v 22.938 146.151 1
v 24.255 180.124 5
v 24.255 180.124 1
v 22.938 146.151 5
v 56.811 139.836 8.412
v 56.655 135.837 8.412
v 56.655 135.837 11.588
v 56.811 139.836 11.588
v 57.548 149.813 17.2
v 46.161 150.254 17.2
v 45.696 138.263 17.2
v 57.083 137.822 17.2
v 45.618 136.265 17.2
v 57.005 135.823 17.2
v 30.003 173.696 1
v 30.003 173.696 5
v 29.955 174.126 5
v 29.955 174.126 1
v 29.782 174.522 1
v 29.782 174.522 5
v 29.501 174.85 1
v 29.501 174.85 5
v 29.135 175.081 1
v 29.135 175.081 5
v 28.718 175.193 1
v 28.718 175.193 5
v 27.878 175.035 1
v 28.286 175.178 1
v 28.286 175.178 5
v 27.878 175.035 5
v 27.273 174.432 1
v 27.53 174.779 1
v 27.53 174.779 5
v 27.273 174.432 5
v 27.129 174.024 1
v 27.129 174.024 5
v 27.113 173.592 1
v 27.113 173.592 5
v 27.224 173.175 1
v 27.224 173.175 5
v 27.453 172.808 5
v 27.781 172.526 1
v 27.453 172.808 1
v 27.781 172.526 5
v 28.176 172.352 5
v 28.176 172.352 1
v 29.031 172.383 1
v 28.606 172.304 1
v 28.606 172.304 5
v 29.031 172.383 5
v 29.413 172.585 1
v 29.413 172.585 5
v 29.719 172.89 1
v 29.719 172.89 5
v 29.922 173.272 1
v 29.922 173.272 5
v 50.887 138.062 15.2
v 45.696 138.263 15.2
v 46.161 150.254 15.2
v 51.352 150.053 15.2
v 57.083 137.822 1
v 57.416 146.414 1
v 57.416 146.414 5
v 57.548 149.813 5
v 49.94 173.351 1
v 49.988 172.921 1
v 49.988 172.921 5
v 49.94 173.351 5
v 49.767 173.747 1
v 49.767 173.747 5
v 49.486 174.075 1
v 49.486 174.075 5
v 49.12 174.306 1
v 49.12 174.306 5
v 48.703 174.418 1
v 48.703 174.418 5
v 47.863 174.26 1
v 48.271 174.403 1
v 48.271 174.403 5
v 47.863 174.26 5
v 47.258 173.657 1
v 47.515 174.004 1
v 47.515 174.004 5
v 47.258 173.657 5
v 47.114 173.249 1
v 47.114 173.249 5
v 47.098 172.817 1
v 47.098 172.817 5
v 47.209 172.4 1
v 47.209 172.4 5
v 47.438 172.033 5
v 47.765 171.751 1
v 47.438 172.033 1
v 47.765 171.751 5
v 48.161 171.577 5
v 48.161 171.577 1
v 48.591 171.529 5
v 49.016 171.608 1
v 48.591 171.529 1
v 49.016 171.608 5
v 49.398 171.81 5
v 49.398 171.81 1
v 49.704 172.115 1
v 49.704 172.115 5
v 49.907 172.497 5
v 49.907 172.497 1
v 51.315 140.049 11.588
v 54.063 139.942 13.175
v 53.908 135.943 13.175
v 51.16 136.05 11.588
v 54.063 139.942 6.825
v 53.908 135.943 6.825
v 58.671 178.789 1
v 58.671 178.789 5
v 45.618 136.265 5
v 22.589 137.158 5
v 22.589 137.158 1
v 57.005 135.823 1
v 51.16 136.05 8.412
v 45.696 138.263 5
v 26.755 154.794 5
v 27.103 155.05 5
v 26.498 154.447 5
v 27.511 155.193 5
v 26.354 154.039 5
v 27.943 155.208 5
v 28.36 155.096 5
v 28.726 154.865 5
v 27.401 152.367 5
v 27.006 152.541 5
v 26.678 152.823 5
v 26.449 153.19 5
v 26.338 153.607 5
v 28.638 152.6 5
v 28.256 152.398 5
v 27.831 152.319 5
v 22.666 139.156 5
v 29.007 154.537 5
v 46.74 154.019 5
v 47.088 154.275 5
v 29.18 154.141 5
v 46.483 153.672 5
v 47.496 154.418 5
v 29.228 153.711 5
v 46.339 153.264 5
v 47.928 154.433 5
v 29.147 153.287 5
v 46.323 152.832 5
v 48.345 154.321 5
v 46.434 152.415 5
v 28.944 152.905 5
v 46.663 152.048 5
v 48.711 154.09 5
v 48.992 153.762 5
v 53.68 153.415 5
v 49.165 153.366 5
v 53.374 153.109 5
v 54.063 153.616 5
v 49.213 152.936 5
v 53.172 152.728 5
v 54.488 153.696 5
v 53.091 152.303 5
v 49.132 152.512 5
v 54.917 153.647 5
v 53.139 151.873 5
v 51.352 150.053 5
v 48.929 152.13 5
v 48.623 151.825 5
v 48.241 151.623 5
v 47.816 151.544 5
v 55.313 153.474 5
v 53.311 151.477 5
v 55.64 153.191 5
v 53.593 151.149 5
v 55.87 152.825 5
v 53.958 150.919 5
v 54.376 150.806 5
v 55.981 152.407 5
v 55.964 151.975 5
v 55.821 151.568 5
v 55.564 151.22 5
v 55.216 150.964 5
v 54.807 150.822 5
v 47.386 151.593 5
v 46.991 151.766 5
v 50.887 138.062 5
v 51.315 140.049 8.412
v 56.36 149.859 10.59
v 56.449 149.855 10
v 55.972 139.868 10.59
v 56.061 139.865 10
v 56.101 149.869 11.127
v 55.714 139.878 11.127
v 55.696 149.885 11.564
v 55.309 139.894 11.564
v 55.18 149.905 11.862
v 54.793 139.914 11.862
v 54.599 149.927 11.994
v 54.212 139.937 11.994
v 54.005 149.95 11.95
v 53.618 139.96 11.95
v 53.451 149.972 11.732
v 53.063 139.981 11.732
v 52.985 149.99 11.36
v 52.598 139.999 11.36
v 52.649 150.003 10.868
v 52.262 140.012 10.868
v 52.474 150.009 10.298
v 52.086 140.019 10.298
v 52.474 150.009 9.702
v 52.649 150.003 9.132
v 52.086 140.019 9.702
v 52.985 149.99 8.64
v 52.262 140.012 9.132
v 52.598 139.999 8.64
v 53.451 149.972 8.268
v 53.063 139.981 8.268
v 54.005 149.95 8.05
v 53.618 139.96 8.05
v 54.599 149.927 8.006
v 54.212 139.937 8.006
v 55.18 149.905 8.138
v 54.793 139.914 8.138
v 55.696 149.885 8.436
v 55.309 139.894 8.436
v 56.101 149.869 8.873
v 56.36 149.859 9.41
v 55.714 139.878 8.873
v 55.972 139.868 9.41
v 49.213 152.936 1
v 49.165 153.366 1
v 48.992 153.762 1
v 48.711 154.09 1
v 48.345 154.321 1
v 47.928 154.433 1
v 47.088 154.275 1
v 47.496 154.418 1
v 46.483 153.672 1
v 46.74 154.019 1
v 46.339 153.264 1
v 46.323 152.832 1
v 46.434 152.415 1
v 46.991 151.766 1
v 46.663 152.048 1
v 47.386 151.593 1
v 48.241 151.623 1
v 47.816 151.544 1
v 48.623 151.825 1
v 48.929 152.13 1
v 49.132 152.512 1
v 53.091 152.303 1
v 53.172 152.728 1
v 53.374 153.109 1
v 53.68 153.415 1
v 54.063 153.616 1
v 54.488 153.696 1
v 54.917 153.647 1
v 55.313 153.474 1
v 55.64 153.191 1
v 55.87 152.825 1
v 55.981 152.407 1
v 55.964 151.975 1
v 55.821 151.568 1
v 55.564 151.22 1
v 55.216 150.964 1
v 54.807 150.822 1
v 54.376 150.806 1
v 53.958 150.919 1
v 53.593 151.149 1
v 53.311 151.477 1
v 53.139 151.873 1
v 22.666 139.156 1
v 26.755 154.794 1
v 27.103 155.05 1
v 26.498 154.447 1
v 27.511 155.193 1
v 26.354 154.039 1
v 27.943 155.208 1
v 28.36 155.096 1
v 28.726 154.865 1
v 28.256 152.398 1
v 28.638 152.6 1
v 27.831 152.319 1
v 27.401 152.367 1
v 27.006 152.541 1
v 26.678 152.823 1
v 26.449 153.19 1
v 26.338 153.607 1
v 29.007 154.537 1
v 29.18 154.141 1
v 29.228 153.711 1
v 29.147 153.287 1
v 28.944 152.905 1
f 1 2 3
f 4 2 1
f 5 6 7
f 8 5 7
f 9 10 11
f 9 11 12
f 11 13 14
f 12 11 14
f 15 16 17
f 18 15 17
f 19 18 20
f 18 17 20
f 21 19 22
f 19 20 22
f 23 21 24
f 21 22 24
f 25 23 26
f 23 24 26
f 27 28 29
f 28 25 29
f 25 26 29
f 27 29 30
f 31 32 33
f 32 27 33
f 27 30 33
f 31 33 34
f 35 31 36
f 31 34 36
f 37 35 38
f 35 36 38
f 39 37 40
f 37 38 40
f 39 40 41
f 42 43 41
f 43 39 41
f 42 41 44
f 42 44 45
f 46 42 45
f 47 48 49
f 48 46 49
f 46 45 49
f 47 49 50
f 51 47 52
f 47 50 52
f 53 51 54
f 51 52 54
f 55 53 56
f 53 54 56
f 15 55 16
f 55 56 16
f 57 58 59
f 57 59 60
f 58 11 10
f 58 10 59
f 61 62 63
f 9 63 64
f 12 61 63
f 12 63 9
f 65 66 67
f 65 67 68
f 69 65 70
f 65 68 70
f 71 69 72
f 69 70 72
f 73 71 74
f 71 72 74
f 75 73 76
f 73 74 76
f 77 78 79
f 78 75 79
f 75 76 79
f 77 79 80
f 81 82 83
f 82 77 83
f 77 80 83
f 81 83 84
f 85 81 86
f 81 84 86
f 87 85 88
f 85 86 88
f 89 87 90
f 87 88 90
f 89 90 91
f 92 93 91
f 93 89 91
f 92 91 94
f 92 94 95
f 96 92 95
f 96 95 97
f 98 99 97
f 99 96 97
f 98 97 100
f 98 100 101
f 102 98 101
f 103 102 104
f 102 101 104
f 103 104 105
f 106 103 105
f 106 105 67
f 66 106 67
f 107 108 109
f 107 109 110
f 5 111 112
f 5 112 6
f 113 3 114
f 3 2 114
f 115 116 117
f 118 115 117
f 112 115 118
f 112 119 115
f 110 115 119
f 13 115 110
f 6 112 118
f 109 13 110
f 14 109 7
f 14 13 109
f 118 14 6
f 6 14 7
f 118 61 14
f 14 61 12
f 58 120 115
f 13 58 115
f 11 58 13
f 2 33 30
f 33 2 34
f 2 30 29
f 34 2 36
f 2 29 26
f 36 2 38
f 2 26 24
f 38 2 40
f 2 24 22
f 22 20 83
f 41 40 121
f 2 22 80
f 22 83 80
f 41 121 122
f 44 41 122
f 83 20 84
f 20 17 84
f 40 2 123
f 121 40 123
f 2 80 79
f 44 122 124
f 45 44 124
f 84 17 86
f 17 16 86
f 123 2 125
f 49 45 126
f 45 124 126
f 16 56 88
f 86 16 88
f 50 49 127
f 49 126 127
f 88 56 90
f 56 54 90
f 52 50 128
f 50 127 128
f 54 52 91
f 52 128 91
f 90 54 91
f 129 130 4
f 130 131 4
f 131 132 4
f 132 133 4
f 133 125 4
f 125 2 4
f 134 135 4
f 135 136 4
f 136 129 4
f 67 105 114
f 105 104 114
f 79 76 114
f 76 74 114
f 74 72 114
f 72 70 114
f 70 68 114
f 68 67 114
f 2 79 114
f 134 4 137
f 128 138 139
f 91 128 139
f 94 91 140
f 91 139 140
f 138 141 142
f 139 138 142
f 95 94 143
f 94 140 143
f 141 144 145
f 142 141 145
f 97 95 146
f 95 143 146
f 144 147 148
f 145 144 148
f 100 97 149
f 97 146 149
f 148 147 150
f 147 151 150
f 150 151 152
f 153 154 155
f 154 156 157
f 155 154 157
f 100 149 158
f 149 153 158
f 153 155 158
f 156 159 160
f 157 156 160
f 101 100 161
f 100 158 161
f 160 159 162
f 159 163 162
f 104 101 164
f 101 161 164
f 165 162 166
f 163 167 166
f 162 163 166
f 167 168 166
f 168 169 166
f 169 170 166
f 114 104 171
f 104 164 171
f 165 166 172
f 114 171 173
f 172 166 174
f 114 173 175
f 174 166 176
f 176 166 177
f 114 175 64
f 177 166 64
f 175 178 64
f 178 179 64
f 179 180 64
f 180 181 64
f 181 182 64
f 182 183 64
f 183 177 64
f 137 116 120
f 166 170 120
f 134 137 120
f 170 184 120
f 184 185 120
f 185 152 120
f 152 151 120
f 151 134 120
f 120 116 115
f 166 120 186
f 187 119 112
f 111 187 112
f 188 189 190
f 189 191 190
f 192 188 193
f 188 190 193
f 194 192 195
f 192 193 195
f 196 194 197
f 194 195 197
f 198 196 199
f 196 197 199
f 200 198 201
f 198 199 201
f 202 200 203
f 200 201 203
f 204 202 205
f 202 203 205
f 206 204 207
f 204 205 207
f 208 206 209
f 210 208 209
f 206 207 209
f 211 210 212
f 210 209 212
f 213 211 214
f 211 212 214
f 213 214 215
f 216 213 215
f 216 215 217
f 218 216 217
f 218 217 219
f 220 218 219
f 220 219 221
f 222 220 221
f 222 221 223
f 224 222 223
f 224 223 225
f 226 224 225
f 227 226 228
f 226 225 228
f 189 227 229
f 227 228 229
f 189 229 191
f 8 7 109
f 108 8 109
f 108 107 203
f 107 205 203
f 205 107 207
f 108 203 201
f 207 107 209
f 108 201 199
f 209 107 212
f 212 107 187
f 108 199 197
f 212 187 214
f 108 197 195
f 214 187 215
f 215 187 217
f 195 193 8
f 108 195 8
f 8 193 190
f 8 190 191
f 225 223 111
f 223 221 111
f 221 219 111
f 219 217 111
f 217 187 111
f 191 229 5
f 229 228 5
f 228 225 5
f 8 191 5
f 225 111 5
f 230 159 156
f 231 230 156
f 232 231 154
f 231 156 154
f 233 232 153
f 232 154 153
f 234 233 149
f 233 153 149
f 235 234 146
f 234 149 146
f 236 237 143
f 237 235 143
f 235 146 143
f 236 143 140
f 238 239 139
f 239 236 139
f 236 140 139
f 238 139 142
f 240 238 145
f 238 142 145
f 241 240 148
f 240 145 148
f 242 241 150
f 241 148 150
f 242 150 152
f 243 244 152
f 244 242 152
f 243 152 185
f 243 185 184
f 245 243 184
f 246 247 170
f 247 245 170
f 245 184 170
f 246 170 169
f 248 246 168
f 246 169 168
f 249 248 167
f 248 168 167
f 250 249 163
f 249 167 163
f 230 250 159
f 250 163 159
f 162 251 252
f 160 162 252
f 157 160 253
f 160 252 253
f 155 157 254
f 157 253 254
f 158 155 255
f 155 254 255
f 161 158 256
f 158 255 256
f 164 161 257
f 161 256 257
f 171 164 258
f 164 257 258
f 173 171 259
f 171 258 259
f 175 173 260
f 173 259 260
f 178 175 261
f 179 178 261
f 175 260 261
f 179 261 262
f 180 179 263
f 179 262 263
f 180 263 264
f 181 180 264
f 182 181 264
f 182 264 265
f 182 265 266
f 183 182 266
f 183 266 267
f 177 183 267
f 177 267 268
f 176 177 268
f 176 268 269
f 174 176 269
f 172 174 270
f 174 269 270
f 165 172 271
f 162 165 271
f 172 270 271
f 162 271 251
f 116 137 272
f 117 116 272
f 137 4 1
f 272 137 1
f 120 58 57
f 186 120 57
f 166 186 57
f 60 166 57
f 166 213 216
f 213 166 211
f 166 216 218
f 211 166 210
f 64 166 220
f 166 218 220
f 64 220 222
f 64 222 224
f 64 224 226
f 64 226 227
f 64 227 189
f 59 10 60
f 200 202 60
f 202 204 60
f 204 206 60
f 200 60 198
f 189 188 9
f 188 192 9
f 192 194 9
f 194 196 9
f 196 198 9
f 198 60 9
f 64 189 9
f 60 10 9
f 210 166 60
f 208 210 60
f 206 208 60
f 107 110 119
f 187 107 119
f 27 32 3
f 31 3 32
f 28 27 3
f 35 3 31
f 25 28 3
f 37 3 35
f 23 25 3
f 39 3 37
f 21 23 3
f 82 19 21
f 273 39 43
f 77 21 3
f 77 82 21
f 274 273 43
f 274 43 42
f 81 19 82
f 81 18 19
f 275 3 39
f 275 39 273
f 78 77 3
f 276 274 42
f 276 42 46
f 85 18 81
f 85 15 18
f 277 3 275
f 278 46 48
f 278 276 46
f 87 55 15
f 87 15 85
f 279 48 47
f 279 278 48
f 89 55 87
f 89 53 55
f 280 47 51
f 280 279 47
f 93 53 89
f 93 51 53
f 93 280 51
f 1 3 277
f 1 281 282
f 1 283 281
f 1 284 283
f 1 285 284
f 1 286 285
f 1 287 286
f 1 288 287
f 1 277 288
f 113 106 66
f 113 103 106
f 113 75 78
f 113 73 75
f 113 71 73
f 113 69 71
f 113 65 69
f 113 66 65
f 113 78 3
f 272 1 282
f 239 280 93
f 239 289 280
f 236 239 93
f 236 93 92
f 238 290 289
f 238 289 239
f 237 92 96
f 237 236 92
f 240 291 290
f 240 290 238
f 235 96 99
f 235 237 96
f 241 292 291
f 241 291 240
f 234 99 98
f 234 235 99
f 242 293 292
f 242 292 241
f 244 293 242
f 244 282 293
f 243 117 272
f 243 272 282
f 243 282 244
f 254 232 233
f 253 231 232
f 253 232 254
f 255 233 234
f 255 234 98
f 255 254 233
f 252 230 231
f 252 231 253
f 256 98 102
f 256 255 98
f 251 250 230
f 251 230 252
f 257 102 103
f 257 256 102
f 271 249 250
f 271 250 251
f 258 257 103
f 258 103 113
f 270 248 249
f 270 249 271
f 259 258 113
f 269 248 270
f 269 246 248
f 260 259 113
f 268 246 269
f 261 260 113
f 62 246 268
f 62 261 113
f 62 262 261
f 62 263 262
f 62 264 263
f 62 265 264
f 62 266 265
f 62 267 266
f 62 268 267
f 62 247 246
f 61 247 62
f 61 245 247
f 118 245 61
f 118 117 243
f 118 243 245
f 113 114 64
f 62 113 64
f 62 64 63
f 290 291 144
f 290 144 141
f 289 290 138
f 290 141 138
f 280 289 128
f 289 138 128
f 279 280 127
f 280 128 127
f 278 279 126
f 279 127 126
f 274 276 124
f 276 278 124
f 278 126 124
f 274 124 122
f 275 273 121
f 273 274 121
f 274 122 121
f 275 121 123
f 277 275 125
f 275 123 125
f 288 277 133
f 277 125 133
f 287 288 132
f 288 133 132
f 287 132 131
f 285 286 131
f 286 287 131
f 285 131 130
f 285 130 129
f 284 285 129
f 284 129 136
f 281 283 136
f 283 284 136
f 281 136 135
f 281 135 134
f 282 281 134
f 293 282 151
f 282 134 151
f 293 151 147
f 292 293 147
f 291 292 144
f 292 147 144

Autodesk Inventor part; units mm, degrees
ref_plane "YZ Plane" through (0, 0, 0) normal (1, 0, 0) x (0, 1, 0)
ref_plane "XZ Plane" through (0, 0, 0) normal (0, 1, 0) x (-1, 0, 0)
ref_plane "XY Plane" through (0, 0, 0) normal (0, 0, 1) x (1, 0, 0)
ref_plane "Work Plane3" through (68.5837, 137.6229, 5) normal (0, 0, -1) x (0.999249, -0.038749, 0)
sketch "Sketch3" plane through (68.5837, 137.6229, 5) normal (0, 0, -1) x (0.999249, -0.038749, 0)
  line L0 (-44.3, -40.7514) -> (-37.8, -40.7514) projected
  line L1 (-37.8, -8.3514) -> (-37.8, -40.7514) projected
  line L2 (-44.3, -8.3514) -> (-37.8, -8.3514) projected
  line L3 (-44.3, -8.3514) -> (-44.3, -40.7514) projected
  circle A0 centre (-41.4, -14.5514) radius 1.75 construction
  circle A1 centre (-41.4, -34.5514) radius 1.75 construction
  line L4 (-25, -40.7514) -> (-18.5, -40.7514) projected
  line L5 (-18.5, -8.3514) -> (-18.5, -40.7514) projected
  line L6 (-25, -8.3514) -> (-18.5, -8.3514) projected
  line L7 (-25, -8.3514) -> (-25, -40.7514) projected
  circle A2 centre (-21.4, -14.5514) radius 1.75 construction
  circle A3 centre (-21.4, -34.5514) radius 1.75 construction
  line L8 (-18.5, -40.7514) -> (-45.9422, -40.7514)
  line L9 (-45.9422, -40.7514) -> (-45.9422, -6.7531)
  line L10 (-45.9422, -6.7531) -> (-18.5, -6.7531)
  line L11 (-18.5, -6.7531) -> (-18.5, -40.7514)
  circle A4 centre (-41.4, -14.5514) radius 1.75 projected
  circle A5 centre (-41.4, -34.5514) radius 1.45
  circle A6 centre (-41.4, -14.5514) radius 1.45
  circle A7 centre (-21.4, -14.5514) radius 1.45
  circle A8 centre (-21.4, -34.5514) radius 1.45
  line L12 (-17.9, -8.3514) -> (-17.9, -40.7514) projected
  line L13 (-18.5, -40.7514) -> (-11.5, -40.7514)
  line L14 (-11.5, -40.7514) -> (-11.5, -8.3514)
  line L15 (-11.5, -8.3514) -> (-18.5, -8.3514)
  line L16 (-18.5, -8.3514) -> (-18.5, -40.7514)
  point P0 (-63.1994, 140.177)
  dimension "d12" = 2.9
  dimension "d13" = 2.9
  dimension "d14" = 2.9
  dimension "d15" = 2.9
  dimension "d16" = 7
extrude "Extrusion3" add sketch "Sketch3" along normal blind 4 contours L3 L2 L1 L0 | L8 L9 L10 L11 L6 L7 L1 L2 L3 | L7 L6 L5 L4 | L5 L15 L12 L13 | L12 L15 L14 L13 | A4
ref_plane "Work Plane4" through (22.9376, 146.1511, 1) normal (-0.038749, -0.999249, 0) x (0.999249, -0.038749, 0)
sketch "Sketch4" plane through (22.9376, 146.1511, 1) normal (-0.038749, -0.999249, 0) x (0.999249, -0.038749, 0)
  line L0 (27.4422, 4) -> (0, 4) projected
  line L1 (0, 4) -> (0, 0) projected
  line L2 (27.4422, 0) -> (0, 0) projected
  arc A0 (20.387, 12.6266) -> (19.8094, 12.1273) centre (20.8422, 11.5162) ccw construction
  arc A1 (19.616, 12.0055) -> (19.8094, 12.1273) centre (19.5942, 12.2545) ccw construction
  line L3 (19.616, 12.0055) -> (19.2704, 11.9753) construction
  arc A2 (19.2704, 11.9753) -> (19.0422, 11.7262) centre (19.2922, 11.7262) ccw construction
  line L4 (19.0422, 11.7262) -> (19.0422, 11.2738) construction
  arc A3 (19.0422, 11.2738) -> (19.2704, 11.0247) centre (19.2922, 11.2738) ccw construction
  line L5 (19.2704, 11.0247) -> (19.637, 10.9927) construction
  arc A4 (19.8267, 10.8768) -> (19.637, 10.9927) centre (19.6152, 10.7436) ccw construction
  arc A5 (19.8267, 10.8768) -> (20.387, 10.4059) centre (20.8422, 11.5162) ccw construction
  arc A6 (20.5422, 10.1746) -> (20.387, 10.4059) centre (20.2922, 10.1746) ccw construction
  line L6 (20.5422, 10.1746) -> (20.5422, 9.5) construction
  line L7 (20.5422, 9.5) -> (20.0422, 9) construction
  line L8 (20.0422, 9) -> (9.0422, 9) construction
  line L9 (9.0422, 9) -> (8.5422, 9.5) construction
  line L10 (8.5422, 9.5) -> (8.5422, 10.1746) construction
  arc A7 (8.6974, 10.4059) -> (8.5422, 10.1746) centre (8.7922, 10.1746) ccw construction
  arc A8 (8.6974, 10.4059) -> (9.2577, 10.8768) centre (8.2422, 11.5162) ccw construction
  arc A9 (9.4474, 10.9927) -> (9.2577, 10.8768) centre (9.4692, 10.7436) ccw construction
  line L11 (9.4474, 10.9927) -> (9.814, 11.0247) construction
  arc A10 (9.814, 11.0247) -> (10.0422, 11.2738) centre (9.7922, 11.2738) ccw construction
  line L12 (10.0422, 11.2738) -> (10.0422, 11.7262) construction
  arc A11 (10.0422, 11.7262) -> (9.814, 11.9753) centre (9.7922, 11.7262) ccw construction
  line L13 (9.814, 11.9753) -> (9.4684, 12.0055) construction
  arc A12 (9.275, 12.1273) -> (9.4684, 12.0055) centre (9.4902, 12.2545) ccw construction
  arc A13 (9.275, 12.1273) -> (8.6974, 12.6266) centre (8.2422, 11.5162) ccw construction
  arc A14 (8.5422, 12.8579) -> (8.6974, 12.6266) centre (8.7922, 12.8579) ccw construction
  line L14 (8.5422, 12.8579) -> (8.5422, 14) construction
  line L15 (8.5422, 14) -> (1.6422, 14) construction
  line L16 (1.6422, 14) -> (1.0422, 13.4) construction
  line L17 (1.0422, 13.4) -> (1.0422, 10) construction
  arc A15 (1.0422, 9.2) -> (1.0422, 10) centre (0.7422, 9.6) ccw construction
  line L18 (1.0422, 9.2) -> (1.0422, 4.6) construction
  line L19 (1.0422, 4.6) -> (1.6422, 4) construction
  line L20 (1.6422, 4) -> (8.1422, 4) construction
  line L21 (8.1422, 4) -> (8.5422, 4.4) construction
  line L22 (8.5422, 4.4) -> (20.5422, 4.4) construction
  line L23 (20.5422, 4.4) -> (20.9422, 4) construction
  line L24 (20.9422, 4) -> (27.4422, 4) construction
  line L25 (27.4422, 4) -> (28.0422, 4.6) construction
  line L26 (28.0422, 4.6) -> (28.0422, 13.4) construction
  line L27 (28.0422, 13.4) -> (27.4422, 14) construction
  line L28 (27.4422, 14) -> (20.5422, 14) construction
  line L29 (20.5422, 14) -> (20.5422, 12.8579) construction
  arc A16 (20.387, 12.6266) -> (20.5422, 12.8579) centre (20.2922, 12.8579) ccw construction
  line L30 (0, 4) -> (34.4422, 4) projected
  line L31 (34.4422, 4) -> (28.2422, 4)
  line L32 (28.2422, 4) -> (28.2422, 16.2)
  line L33 (28.2422, 16.2) -> (34.4422, 16.2)
  line L34 (34.4422, 16.2) -> (34.4422, 4)
  line L35 (28.2422, 16.2) -> (23.0467, 16.2)
  line L36 (23.0467, 16.2) -> (23.0467, 14.2)
  line L37 (23.0467, 14.2) -> (28.2422, 14.2)
  line L38 (28.2422, 14.2) -> (28.2422, 16.2)
  circle A17 centre (31.3422, 9) radius 2
  line L39 (27.4422, 4) -> (27.4422, 0) projected
  line L40 (27.4422, 0) -> (34.4422, 0)
  line L41 (34.4422, 0) -> (34.4422, 4)
  line L42 (34.4422, 4) -> (27.4422, 4)
  line L43 (27.4422, 4) -> (27.4422, 0)
  point P0 (-17.2572, -1)
  dimension "d17" = 0.2
  dimension "d18" = 0.2
  dimension "d19" = 2
  dimension "d20" = 4
extrude "Extrusion4" add sketch "Sketch4" against normal blind 5
ref_plane "Work Plane5" through (22.9376, 146.1511, 1) normal (-0.038749, -0.999249, 0) x (0.999249, -0.038749, 0)
sketch "Sketch6" plane through (22.9376, 146.1511, 1) normal (-0.038749, -0.999249, 0) x (0.999249, -0.038749, 0)
  line L0 (27.4422, 4) -> (0, 4) projected
  line L1 (0, 4) -> (0, 0) projected
  line L2 (27.4422, 0) -> (0, 0) projected
  line L3 (27.4422, 4) -> (27.4422, 0) projected
  line L4 (28.2422, 14.2) -> (23.0467, 14.2) projected
  line L5 (23.0467, 14.2) -> (28.2422, 14.2)
  line L6 (28.2422, 14.2) -> (28.2422, 4)
  line L7 (28.2422, 4) -> (23.0467, 4)
  line L8 (23.0467, 4) -> (23.0467, 14.2)
  line L9 (27.4422, 4) -> (28.2422, 4) projected
  line L10 (27.4422, 4) -> (27.4422, 0) projected
  line L11 (34.4422, 0) -> (27.4422, 0) projected
  line L12 (34.4422, 4) -> (34.4422, 0) projected
  line L13 (28.2422, 4) -> (34.4422, 4) projected
  circle A0 centre (31.3422, 9) radius 2 projected
  line L14 (34.4422, 16.2) -> (23.0467, 16.2) projected
  line L15 (23.0467, 16.2) -> (23.0467, 14.2) projected
  line L16 (23.0467, 14.2) -> (28.2422, 14.2) projected
  line L17 (28.2422, 4) -> (28.2422, 14.2) projected
  line L18 (34.4422, 16.2) -> (34.4422, 0) projected
  line L19 (28.2422, 4) -> (0, 4) projected
  line L20 (0, 4) -> (0, 0) projected
  line L21 (0, 0) -> (34.4422, 0) projected
  point P0 (-17.2572, -1)
extrude "Extrusion6" add sketch "Sketch6" along normal blind 7 contours L3 L2 L1 L0 | L7 L13 L12 L11 L3 | L6 L4 L15 L14 L18 L13
ref_plane "Work Plane6" through (22.6664, 139.1564, 1) normal (-0.038749, -0.999249, 0) x (0.999249, -0.038749, 0)
sketch "Sketch7" plane through (22.6664, 139.1564, 1) normal (-0.038749, -0.999249, 0) x (0.999249, -0.038749, 0)
  circle A0 centre (31.3422, 9) radius 2 projected
  line L0 (28.2422, 4) -> (0, 4) projected
  line L1 (0, 4) -> (0, 0) projected
  line L2 (0, 0) -> (34.4422, 0) projected
  line L3 (23.0467, 14.2) -> (23.0467, 16.2) projected
  line L4 (28.2422, 4) -> (34.4422, 4) projected
  line L5 (23.0467, 14.2) -> (28.2422, 14.2)
  line L6 (28.2422, 14.2) -> (28.2422, 4)
  line L7 (28.2422, 4) -> (23.0467, 4)
  line L8 (23.0467, 4) -> (23.0467, 14.2)
  line L9 (34.4422, 0) -> (34.4422, 16.2) projected
  line L10 (34.4422, 16.2) -> (23.0467, 16.2) projected
  line L11 (23.0467, 16.2) -> (23.0467, 14.2) projected
  line L12 (23.0467, 14.2) -> (28.2422, 14.2) projected
  line L13 (28.2422, 14.2) -> (28.2422, 4) projected
  point P0 (-17.2572, -1)
extrude "Extrusion7" add sketch "Sketch7" along normal blind 2
sketch "Sketch5" plane through (22.5889, 137.1579, 1) normal (0.038749, 0.999249, 0) x (0.999249, -0.038749, 0)
  circle A0 centre (31.3422, -9) radius 2 projected
  line L0 (28.5922, -10.5877) -> (28.5922, -7.4123)
  line L1 (28.5922, -7.4123) -> (31.3422, -5.8246)
  line L2 (31.3422, -5.8246) -> (34.0922, -7.4123)
  line L3 (34.0922, -7.4123) -> (34.0922, -10.5877)
  line L4 (34.0922, -10.5877) -> (31.3422, -12.1754)
  line L5 (31.3422, -12.1754) -> (28.5922, -10.5877)
  point P0 (-17.2572, 1)
  point P1 (31.3422, -9)
  dimension "d23" = 0
  dimension "d24" = 5.5
extrude "Extrusion5" cut sketch "Sketch5" along normal blind 4
sketch "Sketch8" plane through (68.5837, 137.6229, 1) normal (0, 0, -1) x (-0.999249, 0.038749, 0)
  line L0 (22.8955, 11.7531) -> (11.5, 11.7531) projected
  line L1 (12.6, 1.7531) -> (16.6, 1.7531) projected
  circle A0 centre (14.6, 14.0688) radius 1.45
  point P0 (63.1994, -140.177)
  dimension "d31" = 2.9
extrude "Extrusion8" cut sketch "Sketch8" against normal up to surface
sketch "Sketch9" plane through (22.5889, 137.1579, 1) normal (-0.038749, -0.999249, 0) x (0.999249, -0.038749, 0)
  circle A0 centre (15.7007, 11.4189) radius 1.45 projected
  point P0 (-17.2572, -1)
extrude "Extrusion9" cut sketch "Sketch9" against normal blind 5
equation "\"d32\" = d31"
properties part number "30_cellSTORM_translation_y"
